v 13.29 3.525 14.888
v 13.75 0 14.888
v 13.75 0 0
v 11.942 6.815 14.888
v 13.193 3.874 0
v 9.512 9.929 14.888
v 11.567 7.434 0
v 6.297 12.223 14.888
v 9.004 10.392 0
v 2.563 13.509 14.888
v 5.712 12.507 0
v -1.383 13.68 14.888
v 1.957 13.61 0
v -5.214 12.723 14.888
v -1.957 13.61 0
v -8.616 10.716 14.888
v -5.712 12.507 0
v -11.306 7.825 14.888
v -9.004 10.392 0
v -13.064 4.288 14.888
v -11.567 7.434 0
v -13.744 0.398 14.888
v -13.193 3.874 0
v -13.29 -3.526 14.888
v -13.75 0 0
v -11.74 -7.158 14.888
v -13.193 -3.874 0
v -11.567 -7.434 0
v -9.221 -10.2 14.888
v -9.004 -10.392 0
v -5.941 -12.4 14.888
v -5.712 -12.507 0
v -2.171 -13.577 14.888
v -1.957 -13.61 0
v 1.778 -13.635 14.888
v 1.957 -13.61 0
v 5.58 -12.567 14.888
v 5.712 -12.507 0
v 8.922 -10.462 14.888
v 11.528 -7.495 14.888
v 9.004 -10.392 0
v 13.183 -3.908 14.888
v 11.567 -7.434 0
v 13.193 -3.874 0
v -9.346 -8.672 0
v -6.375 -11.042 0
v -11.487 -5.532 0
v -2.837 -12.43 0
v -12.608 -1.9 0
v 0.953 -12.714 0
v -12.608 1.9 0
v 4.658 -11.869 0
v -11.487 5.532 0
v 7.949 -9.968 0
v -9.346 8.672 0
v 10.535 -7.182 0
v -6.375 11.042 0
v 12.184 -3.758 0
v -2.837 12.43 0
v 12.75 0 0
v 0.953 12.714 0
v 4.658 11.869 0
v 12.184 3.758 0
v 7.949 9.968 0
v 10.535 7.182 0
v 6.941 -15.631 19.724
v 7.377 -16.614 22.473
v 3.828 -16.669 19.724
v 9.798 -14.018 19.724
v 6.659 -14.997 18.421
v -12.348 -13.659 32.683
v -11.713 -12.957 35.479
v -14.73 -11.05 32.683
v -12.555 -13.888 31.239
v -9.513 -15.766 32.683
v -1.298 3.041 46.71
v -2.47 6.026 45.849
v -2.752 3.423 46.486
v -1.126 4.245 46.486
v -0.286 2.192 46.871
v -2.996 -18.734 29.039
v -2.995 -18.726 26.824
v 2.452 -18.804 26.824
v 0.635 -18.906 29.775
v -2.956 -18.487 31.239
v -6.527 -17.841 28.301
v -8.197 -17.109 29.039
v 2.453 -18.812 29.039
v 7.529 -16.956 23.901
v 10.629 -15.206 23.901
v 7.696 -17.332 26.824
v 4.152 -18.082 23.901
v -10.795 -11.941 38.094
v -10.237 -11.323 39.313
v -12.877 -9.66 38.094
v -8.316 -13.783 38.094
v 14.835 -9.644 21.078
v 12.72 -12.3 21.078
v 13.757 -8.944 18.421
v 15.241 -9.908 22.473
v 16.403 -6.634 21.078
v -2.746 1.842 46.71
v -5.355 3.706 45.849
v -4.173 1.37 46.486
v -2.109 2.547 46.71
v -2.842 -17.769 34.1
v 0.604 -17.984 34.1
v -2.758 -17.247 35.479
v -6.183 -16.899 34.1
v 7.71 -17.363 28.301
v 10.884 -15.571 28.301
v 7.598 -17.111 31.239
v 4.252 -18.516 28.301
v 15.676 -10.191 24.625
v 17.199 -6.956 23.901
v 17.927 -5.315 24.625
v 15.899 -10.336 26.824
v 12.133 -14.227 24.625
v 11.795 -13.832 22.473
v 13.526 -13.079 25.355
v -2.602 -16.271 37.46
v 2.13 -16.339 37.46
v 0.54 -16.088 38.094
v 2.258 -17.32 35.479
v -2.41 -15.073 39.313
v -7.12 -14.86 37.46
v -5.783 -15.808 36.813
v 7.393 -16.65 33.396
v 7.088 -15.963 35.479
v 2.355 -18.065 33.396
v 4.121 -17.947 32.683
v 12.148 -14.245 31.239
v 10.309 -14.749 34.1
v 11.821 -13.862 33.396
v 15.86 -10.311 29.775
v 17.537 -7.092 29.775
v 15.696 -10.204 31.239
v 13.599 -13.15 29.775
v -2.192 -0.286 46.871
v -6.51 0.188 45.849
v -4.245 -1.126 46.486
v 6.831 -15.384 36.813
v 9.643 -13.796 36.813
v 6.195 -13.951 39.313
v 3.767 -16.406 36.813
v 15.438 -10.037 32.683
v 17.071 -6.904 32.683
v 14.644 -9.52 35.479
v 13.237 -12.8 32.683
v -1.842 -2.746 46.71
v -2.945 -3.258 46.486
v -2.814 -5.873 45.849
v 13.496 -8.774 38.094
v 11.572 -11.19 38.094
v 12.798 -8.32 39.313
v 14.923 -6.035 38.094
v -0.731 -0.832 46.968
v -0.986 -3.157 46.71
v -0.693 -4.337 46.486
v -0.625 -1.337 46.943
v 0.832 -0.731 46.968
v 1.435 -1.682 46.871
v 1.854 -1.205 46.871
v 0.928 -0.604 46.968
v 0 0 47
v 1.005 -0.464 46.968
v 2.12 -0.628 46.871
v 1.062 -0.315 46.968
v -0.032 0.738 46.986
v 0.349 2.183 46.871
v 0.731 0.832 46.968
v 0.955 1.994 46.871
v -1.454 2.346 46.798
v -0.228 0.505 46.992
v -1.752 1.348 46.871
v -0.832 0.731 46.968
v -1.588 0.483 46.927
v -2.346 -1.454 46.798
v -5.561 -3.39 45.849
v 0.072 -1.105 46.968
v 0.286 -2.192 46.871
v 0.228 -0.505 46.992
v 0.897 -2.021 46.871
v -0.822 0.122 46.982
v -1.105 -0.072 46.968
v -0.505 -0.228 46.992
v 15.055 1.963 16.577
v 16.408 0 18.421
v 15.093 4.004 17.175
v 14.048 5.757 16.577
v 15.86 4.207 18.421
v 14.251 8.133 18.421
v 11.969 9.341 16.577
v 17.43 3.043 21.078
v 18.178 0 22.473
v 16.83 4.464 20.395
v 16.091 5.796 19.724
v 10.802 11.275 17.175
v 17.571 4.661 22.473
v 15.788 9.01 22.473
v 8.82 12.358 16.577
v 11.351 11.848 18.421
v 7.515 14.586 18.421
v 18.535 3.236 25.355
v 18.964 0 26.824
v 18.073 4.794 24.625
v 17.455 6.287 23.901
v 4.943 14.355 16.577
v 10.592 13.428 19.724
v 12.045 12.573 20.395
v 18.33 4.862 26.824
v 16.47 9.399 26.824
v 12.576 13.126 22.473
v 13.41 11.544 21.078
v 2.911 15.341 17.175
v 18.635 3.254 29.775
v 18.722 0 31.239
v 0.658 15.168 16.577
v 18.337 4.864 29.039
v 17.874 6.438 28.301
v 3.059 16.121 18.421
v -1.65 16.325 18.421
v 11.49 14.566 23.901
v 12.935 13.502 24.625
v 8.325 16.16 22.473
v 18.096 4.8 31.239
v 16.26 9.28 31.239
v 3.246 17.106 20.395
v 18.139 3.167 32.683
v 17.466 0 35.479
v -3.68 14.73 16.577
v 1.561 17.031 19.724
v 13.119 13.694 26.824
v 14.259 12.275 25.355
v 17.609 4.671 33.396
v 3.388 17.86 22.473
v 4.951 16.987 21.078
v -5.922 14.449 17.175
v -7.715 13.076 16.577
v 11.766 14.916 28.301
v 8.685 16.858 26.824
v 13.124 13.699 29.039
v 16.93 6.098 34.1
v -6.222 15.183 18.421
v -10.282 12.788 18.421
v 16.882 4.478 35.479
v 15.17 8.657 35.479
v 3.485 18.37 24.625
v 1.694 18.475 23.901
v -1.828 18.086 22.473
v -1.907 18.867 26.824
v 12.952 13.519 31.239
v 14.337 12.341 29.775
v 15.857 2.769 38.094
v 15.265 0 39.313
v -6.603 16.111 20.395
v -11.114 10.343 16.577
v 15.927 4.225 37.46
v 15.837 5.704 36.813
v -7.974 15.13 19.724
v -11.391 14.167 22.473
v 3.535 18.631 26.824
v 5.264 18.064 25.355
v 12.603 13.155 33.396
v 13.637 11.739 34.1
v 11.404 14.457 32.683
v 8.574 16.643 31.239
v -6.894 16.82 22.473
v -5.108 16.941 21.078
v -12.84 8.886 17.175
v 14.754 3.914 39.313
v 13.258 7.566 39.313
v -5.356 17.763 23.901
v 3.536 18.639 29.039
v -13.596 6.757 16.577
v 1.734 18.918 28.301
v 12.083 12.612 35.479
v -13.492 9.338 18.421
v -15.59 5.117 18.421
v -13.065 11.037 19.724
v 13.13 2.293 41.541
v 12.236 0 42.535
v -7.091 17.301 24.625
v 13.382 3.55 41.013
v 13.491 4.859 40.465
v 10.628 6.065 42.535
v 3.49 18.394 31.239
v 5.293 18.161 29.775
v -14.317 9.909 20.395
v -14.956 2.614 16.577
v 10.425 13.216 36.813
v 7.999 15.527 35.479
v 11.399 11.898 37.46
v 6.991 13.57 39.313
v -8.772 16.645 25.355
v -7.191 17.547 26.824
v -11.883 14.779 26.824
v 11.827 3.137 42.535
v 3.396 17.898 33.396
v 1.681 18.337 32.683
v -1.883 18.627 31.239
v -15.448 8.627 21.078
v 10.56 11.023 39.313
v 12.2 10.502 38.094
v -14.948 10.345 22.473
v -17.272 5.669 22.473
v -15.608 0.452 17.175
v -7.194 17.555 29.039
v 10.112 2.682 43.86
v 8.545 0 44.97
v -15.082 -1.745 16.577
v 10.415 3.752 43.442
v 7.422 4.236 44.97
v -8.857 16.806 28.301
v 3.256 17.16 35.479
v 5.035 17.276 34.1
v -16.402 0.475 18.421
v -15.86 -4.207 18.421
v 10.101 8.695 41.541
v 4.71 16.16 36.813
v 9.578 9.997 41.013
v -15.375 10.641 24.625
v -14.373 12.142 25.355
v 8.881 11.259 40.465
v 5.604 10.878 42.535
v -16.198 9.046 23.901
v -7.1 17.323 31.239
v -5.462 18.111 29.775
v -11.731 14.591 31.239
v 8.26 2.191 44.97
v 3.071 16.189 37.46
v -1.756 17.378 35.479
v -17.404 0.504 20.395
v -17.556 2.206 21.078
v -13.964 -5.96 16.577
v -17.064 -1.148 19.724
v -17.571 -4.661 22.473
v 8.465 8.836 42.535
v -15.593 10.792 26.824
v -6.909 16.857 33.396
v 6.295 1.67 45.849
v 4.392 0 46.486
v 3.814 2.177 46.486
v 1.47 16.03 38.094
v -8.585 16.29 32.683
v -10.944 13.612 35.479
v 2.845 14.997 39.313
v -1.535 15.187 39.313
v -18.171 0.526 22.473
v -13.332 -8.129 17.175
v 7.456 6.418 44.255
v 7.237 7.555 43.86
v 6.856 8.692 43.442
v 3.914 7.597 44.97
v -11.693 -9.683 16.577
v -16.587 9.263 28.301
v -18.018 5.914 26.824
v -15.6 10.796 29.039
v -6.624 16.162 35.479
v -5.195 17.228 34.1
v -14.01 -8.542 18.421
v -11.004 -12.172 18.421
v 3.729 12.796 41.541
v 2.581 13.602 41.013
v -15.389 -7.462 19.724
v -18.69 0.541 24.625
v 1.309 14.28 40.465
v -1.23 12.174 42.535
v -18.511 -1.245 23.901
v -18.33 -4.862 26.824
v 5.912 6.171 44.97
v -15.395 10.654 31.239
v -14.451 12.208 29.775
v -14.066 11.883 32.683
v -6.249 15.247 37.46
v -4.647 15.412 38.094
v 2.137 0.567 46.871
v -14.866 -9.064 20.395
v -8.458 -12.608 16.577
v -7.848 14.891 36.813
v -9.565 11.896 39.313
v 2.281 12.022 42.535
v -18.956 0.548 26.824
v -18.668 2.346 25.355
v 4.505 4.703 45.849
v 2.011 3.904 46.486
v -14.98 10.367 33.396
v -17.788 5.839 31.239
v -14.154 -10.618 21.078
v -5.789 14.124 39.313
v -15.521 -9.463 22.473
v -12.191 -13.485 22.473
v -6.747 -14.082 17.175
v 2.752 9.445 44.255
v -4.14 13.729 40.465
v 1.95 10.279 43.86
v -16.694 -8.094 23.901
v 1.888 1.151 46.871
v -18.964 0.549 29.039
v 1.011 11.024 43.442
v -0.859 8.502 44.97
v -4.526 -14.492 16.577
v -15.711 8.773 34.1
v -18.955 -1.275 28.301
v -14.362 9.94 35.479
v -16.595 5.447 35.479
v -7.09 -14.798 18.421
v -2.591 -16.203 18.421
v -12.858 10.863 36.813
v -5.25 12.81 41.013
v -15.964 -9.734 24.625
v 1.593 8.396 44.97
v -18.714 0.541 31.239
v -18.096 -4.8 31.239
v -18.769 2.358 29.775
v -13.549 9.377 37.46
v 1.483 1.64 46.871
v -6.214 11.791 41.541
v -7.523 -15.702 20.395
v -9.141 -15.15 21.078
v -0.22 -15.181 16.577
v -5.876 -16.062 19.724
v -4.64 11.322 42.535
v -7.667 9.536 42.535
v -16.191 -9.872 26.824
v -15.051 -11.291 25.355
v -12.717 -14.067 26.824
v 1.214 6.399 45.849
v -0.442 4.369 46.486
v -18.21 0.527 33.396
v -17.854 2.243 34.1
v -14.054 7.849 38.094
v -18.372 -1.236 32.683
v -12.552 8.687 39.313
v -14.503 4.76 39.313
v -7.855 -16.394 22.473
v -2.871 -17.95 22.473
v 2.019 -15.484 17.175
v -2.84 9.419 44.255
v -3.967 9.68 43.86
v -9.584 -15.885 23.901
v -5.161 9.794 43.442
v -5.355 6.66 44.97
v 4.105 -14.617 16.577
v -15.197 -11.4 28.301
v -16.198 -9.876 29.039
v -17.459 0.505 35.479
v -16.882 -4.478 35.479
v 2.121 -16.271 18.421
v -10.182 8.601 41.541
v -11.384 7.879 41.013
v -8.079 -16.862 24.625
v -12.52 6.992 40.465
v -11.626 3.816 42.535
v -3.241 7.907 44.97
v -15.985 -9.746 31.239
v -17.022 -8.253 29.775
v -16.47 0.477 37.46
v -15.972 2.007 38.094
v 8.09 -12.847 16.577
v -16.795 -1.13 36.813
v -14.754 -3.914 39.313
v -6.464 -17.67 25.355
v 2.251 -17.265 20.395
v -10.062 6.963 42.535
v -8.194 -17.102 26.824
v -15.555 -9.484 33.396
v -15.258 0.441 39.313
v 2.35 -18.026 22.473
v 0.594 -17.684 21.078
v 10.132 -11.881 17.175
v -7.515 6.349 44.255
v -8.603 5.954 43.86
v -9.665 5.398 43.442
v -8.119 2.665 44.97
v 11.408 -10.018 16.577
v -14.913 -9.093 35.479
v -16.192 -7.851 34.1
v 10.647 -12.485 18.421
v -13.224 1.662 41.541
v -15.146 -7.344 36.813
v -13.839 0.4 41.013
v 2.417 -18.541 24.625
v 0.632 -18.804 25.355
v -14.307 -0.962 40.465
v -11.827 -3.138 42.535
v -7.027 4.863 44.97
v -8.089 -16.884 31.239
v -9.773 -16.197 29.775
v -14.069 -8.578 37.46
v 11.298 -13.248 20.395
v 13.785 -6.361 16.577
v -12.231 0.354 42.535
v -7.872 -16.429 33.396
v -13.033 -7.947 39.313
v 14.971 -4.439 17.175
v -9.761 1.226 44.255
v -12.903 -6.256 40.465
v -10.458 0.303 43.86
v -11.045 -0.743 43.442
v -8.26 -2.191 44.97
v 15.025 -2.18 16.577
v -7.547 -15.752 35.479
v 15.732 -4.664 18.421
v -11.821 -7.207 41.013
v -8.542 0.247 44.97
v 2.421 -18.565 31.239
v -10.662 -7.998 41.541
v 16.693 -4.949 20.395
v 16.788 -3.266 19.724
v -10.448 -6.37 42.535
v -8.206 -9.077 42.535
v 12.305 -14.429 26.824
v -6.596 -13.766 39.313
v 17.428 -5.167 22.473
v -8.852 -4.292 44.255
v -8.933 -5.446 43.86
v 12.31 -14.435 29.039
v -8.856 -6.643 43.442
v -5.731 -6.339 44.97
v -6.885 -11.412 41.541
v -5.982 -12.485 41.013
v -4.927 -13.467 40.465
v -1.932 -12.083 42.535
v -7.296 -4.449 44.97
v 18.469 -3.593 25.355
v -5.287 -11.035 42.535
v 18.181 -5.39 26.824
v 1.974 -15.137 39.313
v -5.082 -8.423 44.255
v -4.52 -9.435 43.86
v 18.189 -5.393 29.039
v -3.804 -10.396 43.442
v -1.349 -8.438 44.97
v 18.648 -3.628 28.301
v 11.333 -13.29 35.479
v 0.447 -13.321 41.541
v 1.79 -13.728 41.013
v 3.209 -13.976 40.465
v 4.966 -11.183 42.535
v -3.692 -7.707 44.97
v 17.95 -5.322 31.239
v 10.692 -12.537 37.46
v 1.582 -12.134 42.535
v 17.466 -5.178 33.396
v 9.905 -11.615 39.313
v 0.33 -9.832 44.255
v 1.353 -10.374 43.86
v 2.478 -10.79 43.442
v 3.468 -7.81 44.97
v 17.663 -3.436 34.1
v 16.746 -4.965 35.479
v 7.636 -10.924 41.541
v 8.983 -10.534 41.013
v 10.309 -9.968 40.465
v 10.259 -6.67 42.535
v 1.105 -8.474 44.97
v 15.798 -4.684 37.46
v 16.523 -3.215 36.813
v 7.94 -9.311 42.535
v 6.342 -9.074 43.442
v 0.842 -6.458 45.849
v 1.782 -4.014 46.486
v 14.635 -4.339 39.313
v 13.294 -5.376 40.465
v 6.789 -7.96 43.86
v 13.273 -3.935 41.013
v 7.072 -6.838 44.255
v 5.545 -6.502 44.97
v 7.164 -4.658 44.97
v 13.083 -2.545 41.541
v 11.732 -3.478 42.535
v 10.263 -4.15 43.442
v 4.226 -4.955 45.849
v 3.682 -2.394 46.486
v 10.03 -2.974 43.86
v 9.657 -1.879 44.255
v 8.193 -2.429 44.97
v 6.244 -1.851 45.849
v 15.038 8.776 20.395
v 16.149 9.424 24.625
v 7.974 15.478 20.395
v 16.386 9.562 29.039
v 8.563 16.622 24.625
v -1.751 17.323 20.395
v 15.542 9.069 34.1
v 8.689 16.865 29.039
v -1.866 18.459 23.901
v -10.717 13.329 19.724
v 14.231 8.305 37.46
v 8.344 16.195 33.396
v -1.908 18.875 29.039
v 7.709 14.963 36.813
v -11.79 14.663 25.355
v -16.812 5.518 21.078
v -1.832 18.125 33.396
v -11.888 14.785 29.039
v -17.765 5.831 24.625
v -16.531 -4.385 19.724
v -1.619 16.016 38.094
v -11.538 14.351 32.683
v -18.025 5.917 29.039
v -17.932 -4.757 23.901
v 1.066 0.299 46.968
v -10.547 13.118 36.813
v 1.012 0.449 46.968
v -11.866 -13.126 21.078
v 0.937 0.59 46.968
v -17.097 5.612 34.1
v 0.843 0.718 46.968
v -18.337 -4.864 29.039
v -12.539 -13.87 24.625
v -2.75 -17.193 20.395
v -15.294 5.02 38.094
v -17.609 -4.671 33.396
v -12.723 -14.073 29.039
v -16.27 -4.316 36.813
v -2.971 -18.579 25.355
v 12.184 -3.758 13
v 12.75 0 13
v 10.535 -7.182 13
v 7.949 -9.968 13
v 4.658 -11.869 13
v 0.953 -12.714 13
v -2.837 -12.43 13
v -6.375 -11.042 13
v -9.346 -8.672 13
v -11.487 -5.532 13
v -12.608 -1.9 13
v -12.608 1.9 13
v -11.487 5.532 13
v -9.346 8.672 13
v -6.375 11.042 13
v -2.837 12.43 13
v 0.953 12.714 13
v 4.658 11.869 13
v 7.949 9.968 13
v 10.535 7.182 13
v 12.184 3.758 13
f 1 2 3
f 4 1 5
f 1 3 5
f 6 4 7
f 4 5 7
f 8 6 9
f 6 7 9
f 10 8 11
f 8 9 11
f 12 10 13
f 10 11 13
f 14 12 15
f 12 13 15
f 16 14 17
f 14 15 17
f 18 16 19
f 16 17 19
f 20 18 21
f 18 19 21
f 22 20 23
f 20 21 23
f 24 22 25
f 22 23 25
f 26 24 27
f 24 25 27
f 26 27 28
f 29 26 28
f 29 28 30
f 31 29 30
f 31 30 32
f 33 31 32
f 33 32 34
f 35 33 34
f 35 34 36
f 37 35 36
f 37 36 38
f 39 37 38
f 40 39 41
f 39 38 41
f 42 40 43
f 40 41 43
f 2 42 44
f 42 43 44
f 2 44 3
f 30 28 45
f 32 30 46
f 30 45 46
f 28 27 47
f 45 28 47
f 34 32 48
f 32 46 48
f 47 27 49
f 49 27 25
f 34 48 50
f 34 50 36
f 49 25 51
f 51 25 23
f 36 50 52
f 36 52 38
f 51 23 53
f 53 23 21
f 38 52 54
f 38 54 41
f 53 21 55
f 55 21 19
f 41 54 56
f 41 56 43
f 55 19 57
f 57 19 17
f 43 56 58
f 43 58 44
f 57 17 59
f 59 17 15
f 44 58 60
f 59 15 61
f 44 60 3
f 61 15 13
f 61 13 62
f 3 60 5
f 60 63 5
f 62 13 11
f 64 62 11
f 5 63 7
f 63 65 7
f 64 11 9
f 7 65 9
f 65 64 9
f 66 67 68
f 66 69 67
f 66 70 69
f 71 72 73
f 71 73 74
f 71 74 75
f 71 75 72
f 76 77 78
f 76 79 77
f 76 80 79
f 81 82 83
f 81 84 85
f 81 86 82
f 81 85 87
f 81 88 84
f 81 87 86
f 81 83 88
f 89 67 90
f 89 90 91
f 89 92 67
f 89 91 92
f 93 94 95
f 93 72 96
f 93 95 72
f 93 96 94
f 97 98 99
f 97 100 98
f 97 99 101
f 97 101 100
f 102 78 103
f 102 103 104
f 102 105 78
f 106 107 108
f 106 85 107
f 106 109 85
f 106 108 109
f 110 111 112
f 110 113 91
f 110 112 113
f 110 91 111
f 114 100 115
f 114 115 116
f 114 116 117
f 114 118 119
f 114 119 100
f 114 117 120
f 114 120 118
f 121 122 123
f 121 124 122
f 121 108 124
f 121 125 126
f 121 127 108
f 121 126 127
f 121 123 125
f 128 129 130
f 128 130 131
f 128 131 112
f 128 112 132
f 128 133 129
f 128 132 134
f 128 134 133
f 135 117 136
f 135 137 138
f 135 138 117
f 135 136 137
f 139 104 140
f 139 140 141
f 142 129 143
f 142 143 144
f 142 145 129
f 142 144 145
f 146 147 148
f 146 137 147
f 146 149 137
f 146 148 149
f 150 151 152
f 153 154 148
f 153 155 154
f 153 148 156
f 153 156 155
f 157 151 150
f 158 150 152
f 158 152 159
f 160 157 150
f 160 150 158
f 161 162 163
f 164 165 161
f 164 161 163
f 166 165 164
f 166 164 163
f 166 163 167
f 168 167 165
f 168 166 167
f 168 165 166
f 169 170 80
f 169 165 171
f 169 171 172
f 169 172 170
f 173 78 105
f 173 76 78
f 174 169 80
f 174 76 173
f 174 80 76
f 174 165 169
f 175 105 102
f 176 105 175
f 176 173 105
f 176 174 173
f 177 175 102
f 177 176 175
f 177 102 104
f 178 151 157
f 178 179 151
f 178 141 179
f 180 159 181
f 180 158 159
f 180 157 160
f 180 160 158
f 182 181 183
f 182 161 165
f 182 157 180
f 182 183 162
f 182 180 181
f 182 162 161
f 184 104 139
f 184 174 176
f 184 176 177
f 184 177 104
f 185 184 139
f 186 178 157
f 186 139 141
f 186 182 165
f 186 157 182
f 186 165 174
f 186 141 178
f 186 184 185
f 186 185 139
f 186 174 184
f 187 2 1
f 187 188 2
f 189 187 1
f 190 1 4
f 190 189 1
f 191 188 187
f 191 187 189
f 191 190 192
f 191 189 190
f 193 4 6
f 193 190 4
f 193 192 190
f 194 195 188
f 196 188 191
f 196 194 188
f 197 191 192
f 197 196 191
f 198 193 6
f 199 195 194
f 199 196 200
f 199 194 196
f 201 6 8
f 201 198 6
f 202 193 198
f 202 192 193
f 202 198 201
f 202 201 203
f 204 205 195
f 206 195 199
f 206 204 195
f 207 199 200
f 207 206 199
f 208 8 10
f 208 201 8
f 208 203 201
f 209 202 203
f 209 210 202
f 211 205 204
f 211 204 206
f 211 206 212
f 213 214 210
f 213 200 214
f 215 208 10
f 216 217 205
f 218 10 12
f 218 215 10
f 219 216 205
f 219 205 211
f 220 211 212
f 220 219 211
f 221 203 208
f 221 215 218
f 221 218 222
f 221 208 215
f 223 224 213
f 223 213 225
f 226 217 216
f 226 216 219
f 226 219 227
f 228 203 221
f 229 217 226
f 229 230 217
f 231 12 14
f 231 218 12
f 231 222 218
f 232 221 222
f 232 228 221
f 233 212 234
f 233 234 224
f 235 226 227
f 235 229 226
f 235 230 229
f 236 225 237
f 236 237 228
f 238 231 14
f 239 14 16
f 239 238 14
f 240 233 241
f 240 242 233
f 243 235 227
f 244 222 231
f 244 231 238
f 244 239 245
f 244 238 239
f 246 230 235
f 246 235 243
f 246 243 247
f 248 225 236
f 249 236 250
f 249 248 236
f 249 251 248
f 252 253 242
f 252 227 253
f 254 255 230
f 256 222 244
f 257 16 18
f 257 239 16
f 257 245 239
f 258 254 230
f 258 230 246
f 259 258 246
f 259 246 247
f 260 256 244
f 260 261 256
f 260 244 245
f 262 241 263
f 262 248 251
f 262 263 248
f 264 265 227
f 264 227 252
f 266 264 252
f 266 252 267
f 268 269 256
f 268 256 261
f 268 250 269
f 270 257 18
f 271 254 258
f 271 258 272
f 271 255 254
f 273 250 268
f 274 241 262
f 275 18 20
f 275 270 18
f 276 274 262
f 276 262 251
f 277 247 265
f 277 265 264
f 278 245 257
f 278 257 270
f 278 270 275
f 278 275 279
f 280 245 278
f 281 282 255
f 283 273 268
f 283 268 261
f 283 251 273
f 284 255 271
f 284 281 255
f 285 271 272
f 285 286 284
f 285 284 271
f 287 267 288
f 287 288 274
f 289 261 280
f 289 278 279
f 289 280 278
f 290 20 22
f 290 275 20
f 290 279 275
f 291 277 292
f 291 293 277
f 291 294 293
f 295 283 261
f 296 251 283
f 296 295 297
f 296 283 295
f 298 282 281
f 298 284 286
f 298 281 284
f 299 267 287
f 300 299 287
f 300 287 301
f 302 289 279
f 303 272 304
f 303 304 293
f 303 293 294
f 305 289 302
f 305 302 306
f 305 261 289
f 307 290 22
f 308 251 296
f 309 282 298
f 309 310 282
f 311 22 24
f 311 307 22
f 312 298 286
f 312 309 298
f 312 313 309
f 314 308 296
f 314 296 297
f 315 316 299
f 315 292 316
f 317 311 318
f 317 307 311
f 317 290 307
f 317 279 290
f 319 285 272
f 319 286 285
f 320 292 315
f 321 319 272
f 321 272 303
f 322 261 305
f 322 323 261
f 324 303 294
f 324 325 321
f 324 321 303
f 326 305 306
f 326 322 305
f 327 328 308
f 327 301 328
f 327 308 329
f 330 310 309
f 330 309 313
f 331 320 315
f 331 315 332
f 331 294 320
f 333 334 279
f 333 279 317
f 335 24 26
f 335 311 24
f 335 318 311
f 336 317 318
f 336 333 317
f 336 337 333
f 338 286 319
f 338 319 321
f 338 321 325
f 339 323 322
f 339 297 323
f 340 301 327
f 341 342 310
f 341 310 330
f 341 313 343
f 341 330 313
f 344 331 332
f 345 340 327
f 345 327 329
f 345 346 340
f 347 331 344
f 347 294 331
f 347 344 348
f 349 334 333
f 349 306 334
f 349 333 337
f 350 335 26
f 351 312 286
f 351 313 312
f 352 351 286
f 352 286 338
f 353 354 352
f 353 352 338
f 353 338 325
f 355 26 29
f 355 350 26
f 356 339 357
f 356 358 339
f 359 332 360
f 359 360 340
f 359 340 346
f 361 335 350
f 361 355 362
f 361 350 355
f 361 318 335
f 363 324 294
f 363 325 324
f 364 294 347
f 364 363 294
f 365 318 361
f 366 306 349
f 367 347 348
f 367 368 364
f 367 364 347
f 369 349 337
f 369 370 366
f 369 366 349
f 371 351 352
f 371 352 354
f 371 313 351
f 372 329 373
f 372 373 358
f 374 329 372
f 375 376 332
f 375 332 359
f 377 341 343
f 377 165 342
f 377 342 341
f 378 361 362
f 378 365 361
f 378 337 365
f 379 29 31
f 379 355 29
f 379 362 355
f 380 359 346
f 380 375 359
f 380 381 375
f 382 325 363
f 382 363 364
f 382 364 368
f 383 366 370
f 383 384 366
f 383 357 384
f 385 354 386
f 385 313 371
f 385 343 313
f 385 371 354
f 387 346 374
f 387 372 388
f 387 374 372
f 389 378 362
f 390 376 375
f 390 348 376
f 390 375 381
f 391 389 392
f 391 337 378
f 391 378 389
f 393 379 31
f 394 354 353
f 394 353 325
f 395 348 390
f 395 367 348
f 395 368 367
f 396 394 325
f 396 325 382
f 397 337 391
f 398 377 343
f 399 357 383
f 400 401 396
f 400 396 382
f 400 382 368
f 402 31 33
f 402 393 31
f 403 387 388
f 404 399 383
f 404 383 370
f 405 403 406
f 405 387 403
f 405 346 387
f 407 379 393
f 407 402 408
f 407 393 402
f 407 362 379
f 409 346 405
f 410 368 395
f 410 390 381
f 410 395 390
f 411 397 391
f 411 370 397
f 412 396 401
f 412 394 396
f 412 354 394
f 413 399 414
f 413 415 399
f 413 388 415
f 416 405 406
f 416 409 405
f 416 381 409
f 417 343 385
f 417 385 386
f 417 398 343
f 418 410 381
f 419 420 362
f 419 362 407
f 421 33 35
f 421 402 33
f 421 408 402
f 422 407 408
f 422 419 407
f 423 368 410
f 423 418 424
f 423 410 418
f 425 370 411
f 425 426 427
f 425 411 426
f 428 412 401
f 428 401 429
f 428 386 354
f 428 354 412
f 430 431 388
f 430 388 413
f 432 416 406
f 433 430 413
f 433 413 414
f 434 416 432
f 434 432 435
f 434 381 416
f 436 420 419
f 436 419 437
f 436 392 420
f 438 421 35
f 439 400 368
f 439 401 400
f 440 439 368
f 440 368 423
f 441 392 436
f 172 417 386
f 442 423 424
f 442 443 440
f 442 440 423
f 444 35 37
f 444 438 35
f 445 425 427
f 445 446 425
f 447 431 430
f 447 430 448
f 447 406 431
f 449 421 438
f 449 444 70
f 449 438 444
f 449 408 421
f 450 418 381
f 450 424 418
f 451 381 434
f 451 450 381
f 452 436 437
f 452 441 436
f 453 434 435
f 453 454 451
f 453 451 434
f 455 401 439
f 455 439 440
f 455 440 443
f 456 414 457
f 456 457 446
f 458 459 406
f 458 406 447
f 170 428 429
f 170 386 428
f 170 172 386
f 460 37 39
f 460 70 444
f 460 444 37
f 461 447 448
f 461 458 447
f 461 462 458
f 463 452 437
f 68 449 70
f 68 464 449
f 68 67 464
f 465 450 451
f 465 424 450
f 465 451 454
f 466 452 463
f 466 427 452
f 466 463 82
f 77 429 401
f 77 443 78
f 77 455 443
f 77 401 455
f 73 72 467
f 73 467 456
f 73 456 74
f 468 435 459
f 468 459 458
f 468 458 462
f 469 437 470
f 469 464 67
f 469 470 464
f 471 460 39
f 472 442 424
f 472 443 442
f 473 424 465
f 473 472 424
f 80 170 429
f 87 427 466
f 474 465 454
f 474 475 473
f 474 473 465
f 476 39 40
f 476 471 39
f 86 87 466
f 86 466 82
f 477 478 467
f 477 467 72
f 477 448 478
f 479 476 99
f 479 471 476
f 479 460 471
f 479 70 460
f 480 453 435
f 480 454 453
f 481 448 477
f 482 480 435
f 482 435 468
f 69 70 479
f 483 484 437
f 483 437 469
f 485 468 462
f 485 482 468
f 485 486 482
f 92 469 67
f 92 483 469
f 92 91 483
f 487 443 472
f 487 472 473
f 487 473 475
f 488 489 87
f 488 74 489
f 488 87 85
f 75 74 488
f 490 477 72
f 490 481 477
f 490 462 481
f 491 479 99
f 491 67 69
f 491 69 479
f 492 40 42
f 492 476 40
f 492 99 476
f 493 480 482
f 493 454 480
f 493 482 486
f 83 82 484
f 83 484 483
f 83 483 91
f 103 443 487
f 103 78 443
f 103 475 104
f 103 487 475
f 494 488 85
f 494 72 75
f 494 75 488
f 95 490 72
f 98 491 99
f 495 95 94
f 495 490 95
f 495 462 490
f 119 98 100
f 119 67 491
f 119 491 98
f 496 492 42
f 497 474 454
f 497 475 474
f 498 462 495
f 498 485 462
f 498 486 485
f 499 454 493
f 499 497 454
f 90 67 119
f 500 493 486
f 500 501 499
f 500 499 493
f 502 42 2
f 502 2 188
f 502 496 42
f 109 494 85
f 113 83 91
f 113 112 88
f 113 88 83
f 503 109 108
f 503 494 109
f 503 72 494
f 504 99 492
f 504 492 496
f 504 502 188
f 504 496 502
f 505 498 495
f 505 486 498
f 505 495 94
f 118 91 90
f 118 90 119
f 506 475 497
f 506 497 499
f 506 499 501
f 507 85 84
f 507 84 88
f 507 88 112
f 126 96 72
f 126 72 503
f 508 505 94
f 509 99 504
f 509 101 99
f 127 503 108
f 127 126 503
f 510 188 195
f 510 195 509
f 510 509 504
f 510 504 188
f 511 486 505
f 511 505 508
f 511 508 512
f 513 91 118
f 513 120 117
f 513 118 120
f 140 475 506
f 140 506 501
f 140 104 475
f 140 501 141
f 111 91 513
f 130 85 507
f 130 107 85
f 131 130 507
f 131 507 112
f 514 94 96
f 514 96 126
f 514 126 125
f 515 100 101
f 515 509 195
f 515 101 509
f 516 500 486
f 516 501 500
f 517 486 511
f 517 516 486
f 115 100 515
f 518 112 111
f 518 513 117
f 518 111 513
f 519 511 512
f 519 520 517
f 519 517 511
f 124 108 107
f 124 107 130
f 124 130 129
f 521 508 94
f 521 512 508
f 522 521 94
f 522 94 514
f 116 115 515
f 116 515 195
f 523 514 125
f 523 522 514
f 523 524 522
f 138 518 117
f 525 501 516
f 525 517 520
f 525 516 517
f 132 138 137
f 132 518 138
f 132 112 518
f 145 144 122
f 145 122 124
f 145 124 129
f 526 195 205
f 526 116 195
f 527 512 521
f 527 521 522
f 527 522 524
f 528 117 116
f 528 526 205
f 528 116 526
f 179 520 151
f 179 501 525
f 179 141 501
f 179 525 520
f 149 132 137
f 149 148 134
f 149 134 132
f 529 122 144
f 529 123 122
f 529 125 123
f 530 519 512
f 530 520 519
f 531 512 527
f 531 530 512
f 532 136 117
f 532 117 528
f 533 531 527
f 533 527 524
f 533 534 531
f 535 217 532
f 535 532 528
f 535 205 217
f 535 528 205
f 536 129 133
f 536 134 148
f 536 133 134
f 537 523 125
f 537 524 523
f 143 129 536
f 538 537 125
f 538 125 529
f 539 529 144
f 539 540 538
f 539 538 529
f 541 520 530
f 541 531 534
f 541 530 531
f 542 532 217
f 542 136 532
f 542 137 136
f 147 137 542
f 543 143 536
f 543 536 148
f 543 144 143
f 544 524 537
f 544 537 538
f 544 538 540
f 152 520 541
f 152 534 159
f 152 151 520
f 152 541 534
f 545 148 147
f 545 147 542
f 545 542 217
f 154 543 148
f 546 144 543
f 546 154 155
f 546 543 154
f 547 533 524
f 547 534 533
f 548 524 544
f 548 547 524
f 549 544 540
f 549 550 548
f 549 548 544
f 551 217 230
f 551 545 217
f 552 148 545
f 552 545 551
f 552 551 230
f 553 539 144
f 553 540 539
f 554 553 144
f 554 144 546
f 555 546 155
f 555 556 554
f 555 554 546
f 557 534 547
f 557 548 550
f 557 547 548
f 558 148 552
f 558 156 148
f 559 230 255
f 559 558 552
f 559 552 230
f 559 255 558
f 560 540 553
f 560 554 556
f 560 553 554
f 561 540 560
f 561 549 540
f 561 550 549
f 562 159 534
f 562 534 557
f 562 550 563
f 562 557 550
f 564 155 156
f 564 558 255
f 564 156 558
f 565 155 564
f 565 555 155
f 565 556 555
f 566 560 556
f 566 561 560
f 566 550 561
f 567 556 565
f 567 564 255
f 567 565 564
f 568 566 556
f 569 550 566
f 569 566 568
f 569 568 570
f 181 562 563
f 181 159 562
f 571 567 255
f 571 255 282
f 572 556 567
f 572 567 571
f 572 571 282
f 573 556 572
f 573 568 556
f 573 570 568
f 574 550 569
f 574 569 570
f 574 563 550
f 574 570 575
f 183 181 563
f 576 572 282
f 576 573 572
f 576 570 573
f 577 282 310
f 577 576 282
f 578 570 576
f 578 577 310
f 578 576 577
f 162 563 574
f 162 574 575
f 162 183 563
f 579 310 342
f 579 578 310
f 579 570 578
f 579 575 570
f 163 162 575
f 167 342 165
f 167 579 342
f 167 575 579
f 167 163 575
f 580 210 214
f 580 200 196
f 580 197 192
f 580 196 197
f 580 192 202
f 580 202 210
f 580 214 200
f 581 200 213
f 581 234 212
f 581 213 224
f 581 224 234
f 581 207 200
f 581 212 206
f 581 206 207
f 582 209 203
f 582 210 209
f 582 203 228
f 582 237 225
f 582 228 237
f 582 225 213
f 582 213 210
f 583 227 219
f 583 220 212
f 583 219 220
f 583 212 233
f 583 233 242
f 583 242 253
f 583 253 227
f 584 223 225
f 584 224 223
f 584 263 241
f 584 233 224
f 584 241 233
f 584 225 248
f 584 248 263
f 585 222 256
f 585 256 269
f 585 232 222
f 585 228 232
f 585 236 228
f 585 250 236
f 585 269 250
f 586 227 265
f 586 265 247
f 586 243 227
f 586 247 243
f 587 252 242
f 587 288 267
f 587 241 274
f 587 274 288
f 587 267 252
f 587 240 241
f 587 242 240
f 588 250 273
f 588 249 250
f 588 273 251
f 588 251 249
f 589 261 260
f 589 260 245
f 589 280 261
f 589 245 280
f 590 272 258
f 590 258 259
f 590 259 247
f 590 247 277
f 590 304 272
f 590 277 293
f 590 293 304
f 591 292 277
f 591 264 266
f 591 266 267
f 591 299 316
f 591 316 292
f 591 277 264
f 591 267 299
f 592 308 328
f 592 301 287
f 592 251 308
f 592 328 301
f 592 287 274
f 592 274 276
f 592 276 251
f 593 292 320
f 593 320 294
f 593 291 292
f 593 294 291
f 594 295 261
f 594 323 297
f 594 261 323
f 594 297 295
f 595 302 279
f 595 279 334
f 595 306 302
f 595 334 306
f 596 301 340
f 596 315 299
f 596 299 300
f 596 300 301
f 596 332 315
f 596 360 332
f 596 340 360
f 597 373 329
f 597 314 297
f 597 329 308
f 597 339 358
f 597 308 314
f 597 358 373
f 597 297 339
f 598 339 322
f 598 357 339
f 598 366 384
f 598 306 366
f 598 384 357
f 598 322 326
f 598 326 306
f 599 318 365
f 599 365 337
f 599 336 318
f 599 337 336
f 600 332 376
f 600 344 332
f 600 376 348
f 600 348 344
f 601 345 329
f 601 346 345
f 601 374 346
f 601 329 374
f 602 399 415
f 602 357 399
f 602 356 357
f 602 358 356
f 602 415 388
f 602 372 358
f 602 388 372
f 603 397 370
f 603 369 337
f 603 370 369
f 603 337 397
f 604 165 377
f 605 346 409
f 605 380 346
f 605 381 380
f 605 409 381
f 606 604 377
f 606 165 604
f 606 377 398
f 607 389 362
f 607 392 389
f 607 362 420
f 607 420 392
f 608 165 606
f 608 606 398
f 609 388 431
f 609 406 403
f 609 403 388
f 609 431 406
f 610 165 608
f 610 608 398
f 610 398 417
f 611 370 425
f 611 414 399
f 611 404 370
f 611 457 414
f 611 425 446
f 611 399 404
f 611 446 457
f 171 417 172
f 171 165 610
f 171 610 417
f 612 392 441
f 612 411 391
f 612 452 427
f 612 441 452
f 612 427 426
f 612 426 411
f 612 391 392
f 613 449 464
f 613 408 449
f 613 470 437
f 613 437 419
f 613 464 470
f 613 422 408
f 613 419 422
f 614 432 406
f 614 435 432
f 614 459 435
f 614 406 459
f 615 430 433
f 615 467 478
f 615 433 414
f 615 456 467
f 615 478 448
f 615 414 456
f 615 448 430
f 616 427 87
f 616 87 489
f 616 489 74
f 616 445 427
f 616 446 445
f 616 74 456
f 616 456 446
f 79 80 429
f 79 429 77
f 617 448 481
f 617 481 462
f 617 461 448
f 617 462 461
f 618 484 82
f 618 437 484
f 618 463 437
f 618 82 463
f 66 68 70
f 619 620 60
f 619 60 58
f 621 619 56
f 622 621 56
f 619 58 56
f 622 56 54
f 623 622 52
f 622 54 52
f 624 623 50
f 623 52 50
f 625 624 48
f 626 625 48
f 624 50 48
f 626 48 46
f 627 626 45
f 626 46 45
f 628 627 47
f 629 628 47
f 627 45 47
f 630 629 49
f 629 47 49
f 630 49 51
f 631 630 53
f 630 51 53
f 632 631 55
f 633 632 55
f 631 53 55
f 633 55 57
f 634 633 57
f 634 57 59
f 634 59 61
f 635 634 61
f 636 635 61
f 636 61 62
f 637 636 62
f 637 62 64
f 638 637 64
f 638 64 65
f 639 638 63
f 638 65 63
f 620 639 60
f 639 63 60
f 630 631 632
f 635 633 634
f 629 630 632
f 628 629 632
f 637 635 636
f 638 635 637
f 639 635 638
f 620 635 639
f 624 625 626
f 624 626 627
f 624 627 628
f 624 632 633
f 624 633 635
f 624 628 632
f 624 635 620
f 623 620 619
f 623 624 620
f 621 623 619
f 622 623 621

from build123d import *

# Parameters (mm, degrees)
SKETCH_R     = 13.75
PAD_DEPTH    = 15
SKETCH001_R  = 12.75
POCKET_DEPTH = 13


with BuildPart() as part:
    # Sketch → Pad (new body)
    with BuildSketch(Plane.XY):
        Circle(SKETCH_R)
    extrude(amount=PAD_DEPTH)

    # Sketch001 (on Face2 of Pad) → Pocket (cut)
    with BuildSketch(Plane(origin=(0, 0, 0), x_dir=(1, 0, 0), z_dir=(0, 0, -1))):
        Circle(SKETCH001_R)
    extrude(amount=-POCKET_DEPTH, mode=Mode.SUBTRACT)

    # Sphere → Sphere (revolve)
    with BuildSketch(Plane(origin=(0, 0, 28), x_dir=(1, 0, 0), z_dir=(0, -1, 0))):
        with BuildLine():
            ThreePointArc((13.435029, -13.435029), (17.553711, 7.270985), (0, 19))
            Line((0, 19), (0, -13.435029))
            Line((0, -13.435029), (13.435029, -13.435029))
        make_face()
    revolve(axis=Axis((0, 0, 28), (0, 0, 1)))


solid = part.part
